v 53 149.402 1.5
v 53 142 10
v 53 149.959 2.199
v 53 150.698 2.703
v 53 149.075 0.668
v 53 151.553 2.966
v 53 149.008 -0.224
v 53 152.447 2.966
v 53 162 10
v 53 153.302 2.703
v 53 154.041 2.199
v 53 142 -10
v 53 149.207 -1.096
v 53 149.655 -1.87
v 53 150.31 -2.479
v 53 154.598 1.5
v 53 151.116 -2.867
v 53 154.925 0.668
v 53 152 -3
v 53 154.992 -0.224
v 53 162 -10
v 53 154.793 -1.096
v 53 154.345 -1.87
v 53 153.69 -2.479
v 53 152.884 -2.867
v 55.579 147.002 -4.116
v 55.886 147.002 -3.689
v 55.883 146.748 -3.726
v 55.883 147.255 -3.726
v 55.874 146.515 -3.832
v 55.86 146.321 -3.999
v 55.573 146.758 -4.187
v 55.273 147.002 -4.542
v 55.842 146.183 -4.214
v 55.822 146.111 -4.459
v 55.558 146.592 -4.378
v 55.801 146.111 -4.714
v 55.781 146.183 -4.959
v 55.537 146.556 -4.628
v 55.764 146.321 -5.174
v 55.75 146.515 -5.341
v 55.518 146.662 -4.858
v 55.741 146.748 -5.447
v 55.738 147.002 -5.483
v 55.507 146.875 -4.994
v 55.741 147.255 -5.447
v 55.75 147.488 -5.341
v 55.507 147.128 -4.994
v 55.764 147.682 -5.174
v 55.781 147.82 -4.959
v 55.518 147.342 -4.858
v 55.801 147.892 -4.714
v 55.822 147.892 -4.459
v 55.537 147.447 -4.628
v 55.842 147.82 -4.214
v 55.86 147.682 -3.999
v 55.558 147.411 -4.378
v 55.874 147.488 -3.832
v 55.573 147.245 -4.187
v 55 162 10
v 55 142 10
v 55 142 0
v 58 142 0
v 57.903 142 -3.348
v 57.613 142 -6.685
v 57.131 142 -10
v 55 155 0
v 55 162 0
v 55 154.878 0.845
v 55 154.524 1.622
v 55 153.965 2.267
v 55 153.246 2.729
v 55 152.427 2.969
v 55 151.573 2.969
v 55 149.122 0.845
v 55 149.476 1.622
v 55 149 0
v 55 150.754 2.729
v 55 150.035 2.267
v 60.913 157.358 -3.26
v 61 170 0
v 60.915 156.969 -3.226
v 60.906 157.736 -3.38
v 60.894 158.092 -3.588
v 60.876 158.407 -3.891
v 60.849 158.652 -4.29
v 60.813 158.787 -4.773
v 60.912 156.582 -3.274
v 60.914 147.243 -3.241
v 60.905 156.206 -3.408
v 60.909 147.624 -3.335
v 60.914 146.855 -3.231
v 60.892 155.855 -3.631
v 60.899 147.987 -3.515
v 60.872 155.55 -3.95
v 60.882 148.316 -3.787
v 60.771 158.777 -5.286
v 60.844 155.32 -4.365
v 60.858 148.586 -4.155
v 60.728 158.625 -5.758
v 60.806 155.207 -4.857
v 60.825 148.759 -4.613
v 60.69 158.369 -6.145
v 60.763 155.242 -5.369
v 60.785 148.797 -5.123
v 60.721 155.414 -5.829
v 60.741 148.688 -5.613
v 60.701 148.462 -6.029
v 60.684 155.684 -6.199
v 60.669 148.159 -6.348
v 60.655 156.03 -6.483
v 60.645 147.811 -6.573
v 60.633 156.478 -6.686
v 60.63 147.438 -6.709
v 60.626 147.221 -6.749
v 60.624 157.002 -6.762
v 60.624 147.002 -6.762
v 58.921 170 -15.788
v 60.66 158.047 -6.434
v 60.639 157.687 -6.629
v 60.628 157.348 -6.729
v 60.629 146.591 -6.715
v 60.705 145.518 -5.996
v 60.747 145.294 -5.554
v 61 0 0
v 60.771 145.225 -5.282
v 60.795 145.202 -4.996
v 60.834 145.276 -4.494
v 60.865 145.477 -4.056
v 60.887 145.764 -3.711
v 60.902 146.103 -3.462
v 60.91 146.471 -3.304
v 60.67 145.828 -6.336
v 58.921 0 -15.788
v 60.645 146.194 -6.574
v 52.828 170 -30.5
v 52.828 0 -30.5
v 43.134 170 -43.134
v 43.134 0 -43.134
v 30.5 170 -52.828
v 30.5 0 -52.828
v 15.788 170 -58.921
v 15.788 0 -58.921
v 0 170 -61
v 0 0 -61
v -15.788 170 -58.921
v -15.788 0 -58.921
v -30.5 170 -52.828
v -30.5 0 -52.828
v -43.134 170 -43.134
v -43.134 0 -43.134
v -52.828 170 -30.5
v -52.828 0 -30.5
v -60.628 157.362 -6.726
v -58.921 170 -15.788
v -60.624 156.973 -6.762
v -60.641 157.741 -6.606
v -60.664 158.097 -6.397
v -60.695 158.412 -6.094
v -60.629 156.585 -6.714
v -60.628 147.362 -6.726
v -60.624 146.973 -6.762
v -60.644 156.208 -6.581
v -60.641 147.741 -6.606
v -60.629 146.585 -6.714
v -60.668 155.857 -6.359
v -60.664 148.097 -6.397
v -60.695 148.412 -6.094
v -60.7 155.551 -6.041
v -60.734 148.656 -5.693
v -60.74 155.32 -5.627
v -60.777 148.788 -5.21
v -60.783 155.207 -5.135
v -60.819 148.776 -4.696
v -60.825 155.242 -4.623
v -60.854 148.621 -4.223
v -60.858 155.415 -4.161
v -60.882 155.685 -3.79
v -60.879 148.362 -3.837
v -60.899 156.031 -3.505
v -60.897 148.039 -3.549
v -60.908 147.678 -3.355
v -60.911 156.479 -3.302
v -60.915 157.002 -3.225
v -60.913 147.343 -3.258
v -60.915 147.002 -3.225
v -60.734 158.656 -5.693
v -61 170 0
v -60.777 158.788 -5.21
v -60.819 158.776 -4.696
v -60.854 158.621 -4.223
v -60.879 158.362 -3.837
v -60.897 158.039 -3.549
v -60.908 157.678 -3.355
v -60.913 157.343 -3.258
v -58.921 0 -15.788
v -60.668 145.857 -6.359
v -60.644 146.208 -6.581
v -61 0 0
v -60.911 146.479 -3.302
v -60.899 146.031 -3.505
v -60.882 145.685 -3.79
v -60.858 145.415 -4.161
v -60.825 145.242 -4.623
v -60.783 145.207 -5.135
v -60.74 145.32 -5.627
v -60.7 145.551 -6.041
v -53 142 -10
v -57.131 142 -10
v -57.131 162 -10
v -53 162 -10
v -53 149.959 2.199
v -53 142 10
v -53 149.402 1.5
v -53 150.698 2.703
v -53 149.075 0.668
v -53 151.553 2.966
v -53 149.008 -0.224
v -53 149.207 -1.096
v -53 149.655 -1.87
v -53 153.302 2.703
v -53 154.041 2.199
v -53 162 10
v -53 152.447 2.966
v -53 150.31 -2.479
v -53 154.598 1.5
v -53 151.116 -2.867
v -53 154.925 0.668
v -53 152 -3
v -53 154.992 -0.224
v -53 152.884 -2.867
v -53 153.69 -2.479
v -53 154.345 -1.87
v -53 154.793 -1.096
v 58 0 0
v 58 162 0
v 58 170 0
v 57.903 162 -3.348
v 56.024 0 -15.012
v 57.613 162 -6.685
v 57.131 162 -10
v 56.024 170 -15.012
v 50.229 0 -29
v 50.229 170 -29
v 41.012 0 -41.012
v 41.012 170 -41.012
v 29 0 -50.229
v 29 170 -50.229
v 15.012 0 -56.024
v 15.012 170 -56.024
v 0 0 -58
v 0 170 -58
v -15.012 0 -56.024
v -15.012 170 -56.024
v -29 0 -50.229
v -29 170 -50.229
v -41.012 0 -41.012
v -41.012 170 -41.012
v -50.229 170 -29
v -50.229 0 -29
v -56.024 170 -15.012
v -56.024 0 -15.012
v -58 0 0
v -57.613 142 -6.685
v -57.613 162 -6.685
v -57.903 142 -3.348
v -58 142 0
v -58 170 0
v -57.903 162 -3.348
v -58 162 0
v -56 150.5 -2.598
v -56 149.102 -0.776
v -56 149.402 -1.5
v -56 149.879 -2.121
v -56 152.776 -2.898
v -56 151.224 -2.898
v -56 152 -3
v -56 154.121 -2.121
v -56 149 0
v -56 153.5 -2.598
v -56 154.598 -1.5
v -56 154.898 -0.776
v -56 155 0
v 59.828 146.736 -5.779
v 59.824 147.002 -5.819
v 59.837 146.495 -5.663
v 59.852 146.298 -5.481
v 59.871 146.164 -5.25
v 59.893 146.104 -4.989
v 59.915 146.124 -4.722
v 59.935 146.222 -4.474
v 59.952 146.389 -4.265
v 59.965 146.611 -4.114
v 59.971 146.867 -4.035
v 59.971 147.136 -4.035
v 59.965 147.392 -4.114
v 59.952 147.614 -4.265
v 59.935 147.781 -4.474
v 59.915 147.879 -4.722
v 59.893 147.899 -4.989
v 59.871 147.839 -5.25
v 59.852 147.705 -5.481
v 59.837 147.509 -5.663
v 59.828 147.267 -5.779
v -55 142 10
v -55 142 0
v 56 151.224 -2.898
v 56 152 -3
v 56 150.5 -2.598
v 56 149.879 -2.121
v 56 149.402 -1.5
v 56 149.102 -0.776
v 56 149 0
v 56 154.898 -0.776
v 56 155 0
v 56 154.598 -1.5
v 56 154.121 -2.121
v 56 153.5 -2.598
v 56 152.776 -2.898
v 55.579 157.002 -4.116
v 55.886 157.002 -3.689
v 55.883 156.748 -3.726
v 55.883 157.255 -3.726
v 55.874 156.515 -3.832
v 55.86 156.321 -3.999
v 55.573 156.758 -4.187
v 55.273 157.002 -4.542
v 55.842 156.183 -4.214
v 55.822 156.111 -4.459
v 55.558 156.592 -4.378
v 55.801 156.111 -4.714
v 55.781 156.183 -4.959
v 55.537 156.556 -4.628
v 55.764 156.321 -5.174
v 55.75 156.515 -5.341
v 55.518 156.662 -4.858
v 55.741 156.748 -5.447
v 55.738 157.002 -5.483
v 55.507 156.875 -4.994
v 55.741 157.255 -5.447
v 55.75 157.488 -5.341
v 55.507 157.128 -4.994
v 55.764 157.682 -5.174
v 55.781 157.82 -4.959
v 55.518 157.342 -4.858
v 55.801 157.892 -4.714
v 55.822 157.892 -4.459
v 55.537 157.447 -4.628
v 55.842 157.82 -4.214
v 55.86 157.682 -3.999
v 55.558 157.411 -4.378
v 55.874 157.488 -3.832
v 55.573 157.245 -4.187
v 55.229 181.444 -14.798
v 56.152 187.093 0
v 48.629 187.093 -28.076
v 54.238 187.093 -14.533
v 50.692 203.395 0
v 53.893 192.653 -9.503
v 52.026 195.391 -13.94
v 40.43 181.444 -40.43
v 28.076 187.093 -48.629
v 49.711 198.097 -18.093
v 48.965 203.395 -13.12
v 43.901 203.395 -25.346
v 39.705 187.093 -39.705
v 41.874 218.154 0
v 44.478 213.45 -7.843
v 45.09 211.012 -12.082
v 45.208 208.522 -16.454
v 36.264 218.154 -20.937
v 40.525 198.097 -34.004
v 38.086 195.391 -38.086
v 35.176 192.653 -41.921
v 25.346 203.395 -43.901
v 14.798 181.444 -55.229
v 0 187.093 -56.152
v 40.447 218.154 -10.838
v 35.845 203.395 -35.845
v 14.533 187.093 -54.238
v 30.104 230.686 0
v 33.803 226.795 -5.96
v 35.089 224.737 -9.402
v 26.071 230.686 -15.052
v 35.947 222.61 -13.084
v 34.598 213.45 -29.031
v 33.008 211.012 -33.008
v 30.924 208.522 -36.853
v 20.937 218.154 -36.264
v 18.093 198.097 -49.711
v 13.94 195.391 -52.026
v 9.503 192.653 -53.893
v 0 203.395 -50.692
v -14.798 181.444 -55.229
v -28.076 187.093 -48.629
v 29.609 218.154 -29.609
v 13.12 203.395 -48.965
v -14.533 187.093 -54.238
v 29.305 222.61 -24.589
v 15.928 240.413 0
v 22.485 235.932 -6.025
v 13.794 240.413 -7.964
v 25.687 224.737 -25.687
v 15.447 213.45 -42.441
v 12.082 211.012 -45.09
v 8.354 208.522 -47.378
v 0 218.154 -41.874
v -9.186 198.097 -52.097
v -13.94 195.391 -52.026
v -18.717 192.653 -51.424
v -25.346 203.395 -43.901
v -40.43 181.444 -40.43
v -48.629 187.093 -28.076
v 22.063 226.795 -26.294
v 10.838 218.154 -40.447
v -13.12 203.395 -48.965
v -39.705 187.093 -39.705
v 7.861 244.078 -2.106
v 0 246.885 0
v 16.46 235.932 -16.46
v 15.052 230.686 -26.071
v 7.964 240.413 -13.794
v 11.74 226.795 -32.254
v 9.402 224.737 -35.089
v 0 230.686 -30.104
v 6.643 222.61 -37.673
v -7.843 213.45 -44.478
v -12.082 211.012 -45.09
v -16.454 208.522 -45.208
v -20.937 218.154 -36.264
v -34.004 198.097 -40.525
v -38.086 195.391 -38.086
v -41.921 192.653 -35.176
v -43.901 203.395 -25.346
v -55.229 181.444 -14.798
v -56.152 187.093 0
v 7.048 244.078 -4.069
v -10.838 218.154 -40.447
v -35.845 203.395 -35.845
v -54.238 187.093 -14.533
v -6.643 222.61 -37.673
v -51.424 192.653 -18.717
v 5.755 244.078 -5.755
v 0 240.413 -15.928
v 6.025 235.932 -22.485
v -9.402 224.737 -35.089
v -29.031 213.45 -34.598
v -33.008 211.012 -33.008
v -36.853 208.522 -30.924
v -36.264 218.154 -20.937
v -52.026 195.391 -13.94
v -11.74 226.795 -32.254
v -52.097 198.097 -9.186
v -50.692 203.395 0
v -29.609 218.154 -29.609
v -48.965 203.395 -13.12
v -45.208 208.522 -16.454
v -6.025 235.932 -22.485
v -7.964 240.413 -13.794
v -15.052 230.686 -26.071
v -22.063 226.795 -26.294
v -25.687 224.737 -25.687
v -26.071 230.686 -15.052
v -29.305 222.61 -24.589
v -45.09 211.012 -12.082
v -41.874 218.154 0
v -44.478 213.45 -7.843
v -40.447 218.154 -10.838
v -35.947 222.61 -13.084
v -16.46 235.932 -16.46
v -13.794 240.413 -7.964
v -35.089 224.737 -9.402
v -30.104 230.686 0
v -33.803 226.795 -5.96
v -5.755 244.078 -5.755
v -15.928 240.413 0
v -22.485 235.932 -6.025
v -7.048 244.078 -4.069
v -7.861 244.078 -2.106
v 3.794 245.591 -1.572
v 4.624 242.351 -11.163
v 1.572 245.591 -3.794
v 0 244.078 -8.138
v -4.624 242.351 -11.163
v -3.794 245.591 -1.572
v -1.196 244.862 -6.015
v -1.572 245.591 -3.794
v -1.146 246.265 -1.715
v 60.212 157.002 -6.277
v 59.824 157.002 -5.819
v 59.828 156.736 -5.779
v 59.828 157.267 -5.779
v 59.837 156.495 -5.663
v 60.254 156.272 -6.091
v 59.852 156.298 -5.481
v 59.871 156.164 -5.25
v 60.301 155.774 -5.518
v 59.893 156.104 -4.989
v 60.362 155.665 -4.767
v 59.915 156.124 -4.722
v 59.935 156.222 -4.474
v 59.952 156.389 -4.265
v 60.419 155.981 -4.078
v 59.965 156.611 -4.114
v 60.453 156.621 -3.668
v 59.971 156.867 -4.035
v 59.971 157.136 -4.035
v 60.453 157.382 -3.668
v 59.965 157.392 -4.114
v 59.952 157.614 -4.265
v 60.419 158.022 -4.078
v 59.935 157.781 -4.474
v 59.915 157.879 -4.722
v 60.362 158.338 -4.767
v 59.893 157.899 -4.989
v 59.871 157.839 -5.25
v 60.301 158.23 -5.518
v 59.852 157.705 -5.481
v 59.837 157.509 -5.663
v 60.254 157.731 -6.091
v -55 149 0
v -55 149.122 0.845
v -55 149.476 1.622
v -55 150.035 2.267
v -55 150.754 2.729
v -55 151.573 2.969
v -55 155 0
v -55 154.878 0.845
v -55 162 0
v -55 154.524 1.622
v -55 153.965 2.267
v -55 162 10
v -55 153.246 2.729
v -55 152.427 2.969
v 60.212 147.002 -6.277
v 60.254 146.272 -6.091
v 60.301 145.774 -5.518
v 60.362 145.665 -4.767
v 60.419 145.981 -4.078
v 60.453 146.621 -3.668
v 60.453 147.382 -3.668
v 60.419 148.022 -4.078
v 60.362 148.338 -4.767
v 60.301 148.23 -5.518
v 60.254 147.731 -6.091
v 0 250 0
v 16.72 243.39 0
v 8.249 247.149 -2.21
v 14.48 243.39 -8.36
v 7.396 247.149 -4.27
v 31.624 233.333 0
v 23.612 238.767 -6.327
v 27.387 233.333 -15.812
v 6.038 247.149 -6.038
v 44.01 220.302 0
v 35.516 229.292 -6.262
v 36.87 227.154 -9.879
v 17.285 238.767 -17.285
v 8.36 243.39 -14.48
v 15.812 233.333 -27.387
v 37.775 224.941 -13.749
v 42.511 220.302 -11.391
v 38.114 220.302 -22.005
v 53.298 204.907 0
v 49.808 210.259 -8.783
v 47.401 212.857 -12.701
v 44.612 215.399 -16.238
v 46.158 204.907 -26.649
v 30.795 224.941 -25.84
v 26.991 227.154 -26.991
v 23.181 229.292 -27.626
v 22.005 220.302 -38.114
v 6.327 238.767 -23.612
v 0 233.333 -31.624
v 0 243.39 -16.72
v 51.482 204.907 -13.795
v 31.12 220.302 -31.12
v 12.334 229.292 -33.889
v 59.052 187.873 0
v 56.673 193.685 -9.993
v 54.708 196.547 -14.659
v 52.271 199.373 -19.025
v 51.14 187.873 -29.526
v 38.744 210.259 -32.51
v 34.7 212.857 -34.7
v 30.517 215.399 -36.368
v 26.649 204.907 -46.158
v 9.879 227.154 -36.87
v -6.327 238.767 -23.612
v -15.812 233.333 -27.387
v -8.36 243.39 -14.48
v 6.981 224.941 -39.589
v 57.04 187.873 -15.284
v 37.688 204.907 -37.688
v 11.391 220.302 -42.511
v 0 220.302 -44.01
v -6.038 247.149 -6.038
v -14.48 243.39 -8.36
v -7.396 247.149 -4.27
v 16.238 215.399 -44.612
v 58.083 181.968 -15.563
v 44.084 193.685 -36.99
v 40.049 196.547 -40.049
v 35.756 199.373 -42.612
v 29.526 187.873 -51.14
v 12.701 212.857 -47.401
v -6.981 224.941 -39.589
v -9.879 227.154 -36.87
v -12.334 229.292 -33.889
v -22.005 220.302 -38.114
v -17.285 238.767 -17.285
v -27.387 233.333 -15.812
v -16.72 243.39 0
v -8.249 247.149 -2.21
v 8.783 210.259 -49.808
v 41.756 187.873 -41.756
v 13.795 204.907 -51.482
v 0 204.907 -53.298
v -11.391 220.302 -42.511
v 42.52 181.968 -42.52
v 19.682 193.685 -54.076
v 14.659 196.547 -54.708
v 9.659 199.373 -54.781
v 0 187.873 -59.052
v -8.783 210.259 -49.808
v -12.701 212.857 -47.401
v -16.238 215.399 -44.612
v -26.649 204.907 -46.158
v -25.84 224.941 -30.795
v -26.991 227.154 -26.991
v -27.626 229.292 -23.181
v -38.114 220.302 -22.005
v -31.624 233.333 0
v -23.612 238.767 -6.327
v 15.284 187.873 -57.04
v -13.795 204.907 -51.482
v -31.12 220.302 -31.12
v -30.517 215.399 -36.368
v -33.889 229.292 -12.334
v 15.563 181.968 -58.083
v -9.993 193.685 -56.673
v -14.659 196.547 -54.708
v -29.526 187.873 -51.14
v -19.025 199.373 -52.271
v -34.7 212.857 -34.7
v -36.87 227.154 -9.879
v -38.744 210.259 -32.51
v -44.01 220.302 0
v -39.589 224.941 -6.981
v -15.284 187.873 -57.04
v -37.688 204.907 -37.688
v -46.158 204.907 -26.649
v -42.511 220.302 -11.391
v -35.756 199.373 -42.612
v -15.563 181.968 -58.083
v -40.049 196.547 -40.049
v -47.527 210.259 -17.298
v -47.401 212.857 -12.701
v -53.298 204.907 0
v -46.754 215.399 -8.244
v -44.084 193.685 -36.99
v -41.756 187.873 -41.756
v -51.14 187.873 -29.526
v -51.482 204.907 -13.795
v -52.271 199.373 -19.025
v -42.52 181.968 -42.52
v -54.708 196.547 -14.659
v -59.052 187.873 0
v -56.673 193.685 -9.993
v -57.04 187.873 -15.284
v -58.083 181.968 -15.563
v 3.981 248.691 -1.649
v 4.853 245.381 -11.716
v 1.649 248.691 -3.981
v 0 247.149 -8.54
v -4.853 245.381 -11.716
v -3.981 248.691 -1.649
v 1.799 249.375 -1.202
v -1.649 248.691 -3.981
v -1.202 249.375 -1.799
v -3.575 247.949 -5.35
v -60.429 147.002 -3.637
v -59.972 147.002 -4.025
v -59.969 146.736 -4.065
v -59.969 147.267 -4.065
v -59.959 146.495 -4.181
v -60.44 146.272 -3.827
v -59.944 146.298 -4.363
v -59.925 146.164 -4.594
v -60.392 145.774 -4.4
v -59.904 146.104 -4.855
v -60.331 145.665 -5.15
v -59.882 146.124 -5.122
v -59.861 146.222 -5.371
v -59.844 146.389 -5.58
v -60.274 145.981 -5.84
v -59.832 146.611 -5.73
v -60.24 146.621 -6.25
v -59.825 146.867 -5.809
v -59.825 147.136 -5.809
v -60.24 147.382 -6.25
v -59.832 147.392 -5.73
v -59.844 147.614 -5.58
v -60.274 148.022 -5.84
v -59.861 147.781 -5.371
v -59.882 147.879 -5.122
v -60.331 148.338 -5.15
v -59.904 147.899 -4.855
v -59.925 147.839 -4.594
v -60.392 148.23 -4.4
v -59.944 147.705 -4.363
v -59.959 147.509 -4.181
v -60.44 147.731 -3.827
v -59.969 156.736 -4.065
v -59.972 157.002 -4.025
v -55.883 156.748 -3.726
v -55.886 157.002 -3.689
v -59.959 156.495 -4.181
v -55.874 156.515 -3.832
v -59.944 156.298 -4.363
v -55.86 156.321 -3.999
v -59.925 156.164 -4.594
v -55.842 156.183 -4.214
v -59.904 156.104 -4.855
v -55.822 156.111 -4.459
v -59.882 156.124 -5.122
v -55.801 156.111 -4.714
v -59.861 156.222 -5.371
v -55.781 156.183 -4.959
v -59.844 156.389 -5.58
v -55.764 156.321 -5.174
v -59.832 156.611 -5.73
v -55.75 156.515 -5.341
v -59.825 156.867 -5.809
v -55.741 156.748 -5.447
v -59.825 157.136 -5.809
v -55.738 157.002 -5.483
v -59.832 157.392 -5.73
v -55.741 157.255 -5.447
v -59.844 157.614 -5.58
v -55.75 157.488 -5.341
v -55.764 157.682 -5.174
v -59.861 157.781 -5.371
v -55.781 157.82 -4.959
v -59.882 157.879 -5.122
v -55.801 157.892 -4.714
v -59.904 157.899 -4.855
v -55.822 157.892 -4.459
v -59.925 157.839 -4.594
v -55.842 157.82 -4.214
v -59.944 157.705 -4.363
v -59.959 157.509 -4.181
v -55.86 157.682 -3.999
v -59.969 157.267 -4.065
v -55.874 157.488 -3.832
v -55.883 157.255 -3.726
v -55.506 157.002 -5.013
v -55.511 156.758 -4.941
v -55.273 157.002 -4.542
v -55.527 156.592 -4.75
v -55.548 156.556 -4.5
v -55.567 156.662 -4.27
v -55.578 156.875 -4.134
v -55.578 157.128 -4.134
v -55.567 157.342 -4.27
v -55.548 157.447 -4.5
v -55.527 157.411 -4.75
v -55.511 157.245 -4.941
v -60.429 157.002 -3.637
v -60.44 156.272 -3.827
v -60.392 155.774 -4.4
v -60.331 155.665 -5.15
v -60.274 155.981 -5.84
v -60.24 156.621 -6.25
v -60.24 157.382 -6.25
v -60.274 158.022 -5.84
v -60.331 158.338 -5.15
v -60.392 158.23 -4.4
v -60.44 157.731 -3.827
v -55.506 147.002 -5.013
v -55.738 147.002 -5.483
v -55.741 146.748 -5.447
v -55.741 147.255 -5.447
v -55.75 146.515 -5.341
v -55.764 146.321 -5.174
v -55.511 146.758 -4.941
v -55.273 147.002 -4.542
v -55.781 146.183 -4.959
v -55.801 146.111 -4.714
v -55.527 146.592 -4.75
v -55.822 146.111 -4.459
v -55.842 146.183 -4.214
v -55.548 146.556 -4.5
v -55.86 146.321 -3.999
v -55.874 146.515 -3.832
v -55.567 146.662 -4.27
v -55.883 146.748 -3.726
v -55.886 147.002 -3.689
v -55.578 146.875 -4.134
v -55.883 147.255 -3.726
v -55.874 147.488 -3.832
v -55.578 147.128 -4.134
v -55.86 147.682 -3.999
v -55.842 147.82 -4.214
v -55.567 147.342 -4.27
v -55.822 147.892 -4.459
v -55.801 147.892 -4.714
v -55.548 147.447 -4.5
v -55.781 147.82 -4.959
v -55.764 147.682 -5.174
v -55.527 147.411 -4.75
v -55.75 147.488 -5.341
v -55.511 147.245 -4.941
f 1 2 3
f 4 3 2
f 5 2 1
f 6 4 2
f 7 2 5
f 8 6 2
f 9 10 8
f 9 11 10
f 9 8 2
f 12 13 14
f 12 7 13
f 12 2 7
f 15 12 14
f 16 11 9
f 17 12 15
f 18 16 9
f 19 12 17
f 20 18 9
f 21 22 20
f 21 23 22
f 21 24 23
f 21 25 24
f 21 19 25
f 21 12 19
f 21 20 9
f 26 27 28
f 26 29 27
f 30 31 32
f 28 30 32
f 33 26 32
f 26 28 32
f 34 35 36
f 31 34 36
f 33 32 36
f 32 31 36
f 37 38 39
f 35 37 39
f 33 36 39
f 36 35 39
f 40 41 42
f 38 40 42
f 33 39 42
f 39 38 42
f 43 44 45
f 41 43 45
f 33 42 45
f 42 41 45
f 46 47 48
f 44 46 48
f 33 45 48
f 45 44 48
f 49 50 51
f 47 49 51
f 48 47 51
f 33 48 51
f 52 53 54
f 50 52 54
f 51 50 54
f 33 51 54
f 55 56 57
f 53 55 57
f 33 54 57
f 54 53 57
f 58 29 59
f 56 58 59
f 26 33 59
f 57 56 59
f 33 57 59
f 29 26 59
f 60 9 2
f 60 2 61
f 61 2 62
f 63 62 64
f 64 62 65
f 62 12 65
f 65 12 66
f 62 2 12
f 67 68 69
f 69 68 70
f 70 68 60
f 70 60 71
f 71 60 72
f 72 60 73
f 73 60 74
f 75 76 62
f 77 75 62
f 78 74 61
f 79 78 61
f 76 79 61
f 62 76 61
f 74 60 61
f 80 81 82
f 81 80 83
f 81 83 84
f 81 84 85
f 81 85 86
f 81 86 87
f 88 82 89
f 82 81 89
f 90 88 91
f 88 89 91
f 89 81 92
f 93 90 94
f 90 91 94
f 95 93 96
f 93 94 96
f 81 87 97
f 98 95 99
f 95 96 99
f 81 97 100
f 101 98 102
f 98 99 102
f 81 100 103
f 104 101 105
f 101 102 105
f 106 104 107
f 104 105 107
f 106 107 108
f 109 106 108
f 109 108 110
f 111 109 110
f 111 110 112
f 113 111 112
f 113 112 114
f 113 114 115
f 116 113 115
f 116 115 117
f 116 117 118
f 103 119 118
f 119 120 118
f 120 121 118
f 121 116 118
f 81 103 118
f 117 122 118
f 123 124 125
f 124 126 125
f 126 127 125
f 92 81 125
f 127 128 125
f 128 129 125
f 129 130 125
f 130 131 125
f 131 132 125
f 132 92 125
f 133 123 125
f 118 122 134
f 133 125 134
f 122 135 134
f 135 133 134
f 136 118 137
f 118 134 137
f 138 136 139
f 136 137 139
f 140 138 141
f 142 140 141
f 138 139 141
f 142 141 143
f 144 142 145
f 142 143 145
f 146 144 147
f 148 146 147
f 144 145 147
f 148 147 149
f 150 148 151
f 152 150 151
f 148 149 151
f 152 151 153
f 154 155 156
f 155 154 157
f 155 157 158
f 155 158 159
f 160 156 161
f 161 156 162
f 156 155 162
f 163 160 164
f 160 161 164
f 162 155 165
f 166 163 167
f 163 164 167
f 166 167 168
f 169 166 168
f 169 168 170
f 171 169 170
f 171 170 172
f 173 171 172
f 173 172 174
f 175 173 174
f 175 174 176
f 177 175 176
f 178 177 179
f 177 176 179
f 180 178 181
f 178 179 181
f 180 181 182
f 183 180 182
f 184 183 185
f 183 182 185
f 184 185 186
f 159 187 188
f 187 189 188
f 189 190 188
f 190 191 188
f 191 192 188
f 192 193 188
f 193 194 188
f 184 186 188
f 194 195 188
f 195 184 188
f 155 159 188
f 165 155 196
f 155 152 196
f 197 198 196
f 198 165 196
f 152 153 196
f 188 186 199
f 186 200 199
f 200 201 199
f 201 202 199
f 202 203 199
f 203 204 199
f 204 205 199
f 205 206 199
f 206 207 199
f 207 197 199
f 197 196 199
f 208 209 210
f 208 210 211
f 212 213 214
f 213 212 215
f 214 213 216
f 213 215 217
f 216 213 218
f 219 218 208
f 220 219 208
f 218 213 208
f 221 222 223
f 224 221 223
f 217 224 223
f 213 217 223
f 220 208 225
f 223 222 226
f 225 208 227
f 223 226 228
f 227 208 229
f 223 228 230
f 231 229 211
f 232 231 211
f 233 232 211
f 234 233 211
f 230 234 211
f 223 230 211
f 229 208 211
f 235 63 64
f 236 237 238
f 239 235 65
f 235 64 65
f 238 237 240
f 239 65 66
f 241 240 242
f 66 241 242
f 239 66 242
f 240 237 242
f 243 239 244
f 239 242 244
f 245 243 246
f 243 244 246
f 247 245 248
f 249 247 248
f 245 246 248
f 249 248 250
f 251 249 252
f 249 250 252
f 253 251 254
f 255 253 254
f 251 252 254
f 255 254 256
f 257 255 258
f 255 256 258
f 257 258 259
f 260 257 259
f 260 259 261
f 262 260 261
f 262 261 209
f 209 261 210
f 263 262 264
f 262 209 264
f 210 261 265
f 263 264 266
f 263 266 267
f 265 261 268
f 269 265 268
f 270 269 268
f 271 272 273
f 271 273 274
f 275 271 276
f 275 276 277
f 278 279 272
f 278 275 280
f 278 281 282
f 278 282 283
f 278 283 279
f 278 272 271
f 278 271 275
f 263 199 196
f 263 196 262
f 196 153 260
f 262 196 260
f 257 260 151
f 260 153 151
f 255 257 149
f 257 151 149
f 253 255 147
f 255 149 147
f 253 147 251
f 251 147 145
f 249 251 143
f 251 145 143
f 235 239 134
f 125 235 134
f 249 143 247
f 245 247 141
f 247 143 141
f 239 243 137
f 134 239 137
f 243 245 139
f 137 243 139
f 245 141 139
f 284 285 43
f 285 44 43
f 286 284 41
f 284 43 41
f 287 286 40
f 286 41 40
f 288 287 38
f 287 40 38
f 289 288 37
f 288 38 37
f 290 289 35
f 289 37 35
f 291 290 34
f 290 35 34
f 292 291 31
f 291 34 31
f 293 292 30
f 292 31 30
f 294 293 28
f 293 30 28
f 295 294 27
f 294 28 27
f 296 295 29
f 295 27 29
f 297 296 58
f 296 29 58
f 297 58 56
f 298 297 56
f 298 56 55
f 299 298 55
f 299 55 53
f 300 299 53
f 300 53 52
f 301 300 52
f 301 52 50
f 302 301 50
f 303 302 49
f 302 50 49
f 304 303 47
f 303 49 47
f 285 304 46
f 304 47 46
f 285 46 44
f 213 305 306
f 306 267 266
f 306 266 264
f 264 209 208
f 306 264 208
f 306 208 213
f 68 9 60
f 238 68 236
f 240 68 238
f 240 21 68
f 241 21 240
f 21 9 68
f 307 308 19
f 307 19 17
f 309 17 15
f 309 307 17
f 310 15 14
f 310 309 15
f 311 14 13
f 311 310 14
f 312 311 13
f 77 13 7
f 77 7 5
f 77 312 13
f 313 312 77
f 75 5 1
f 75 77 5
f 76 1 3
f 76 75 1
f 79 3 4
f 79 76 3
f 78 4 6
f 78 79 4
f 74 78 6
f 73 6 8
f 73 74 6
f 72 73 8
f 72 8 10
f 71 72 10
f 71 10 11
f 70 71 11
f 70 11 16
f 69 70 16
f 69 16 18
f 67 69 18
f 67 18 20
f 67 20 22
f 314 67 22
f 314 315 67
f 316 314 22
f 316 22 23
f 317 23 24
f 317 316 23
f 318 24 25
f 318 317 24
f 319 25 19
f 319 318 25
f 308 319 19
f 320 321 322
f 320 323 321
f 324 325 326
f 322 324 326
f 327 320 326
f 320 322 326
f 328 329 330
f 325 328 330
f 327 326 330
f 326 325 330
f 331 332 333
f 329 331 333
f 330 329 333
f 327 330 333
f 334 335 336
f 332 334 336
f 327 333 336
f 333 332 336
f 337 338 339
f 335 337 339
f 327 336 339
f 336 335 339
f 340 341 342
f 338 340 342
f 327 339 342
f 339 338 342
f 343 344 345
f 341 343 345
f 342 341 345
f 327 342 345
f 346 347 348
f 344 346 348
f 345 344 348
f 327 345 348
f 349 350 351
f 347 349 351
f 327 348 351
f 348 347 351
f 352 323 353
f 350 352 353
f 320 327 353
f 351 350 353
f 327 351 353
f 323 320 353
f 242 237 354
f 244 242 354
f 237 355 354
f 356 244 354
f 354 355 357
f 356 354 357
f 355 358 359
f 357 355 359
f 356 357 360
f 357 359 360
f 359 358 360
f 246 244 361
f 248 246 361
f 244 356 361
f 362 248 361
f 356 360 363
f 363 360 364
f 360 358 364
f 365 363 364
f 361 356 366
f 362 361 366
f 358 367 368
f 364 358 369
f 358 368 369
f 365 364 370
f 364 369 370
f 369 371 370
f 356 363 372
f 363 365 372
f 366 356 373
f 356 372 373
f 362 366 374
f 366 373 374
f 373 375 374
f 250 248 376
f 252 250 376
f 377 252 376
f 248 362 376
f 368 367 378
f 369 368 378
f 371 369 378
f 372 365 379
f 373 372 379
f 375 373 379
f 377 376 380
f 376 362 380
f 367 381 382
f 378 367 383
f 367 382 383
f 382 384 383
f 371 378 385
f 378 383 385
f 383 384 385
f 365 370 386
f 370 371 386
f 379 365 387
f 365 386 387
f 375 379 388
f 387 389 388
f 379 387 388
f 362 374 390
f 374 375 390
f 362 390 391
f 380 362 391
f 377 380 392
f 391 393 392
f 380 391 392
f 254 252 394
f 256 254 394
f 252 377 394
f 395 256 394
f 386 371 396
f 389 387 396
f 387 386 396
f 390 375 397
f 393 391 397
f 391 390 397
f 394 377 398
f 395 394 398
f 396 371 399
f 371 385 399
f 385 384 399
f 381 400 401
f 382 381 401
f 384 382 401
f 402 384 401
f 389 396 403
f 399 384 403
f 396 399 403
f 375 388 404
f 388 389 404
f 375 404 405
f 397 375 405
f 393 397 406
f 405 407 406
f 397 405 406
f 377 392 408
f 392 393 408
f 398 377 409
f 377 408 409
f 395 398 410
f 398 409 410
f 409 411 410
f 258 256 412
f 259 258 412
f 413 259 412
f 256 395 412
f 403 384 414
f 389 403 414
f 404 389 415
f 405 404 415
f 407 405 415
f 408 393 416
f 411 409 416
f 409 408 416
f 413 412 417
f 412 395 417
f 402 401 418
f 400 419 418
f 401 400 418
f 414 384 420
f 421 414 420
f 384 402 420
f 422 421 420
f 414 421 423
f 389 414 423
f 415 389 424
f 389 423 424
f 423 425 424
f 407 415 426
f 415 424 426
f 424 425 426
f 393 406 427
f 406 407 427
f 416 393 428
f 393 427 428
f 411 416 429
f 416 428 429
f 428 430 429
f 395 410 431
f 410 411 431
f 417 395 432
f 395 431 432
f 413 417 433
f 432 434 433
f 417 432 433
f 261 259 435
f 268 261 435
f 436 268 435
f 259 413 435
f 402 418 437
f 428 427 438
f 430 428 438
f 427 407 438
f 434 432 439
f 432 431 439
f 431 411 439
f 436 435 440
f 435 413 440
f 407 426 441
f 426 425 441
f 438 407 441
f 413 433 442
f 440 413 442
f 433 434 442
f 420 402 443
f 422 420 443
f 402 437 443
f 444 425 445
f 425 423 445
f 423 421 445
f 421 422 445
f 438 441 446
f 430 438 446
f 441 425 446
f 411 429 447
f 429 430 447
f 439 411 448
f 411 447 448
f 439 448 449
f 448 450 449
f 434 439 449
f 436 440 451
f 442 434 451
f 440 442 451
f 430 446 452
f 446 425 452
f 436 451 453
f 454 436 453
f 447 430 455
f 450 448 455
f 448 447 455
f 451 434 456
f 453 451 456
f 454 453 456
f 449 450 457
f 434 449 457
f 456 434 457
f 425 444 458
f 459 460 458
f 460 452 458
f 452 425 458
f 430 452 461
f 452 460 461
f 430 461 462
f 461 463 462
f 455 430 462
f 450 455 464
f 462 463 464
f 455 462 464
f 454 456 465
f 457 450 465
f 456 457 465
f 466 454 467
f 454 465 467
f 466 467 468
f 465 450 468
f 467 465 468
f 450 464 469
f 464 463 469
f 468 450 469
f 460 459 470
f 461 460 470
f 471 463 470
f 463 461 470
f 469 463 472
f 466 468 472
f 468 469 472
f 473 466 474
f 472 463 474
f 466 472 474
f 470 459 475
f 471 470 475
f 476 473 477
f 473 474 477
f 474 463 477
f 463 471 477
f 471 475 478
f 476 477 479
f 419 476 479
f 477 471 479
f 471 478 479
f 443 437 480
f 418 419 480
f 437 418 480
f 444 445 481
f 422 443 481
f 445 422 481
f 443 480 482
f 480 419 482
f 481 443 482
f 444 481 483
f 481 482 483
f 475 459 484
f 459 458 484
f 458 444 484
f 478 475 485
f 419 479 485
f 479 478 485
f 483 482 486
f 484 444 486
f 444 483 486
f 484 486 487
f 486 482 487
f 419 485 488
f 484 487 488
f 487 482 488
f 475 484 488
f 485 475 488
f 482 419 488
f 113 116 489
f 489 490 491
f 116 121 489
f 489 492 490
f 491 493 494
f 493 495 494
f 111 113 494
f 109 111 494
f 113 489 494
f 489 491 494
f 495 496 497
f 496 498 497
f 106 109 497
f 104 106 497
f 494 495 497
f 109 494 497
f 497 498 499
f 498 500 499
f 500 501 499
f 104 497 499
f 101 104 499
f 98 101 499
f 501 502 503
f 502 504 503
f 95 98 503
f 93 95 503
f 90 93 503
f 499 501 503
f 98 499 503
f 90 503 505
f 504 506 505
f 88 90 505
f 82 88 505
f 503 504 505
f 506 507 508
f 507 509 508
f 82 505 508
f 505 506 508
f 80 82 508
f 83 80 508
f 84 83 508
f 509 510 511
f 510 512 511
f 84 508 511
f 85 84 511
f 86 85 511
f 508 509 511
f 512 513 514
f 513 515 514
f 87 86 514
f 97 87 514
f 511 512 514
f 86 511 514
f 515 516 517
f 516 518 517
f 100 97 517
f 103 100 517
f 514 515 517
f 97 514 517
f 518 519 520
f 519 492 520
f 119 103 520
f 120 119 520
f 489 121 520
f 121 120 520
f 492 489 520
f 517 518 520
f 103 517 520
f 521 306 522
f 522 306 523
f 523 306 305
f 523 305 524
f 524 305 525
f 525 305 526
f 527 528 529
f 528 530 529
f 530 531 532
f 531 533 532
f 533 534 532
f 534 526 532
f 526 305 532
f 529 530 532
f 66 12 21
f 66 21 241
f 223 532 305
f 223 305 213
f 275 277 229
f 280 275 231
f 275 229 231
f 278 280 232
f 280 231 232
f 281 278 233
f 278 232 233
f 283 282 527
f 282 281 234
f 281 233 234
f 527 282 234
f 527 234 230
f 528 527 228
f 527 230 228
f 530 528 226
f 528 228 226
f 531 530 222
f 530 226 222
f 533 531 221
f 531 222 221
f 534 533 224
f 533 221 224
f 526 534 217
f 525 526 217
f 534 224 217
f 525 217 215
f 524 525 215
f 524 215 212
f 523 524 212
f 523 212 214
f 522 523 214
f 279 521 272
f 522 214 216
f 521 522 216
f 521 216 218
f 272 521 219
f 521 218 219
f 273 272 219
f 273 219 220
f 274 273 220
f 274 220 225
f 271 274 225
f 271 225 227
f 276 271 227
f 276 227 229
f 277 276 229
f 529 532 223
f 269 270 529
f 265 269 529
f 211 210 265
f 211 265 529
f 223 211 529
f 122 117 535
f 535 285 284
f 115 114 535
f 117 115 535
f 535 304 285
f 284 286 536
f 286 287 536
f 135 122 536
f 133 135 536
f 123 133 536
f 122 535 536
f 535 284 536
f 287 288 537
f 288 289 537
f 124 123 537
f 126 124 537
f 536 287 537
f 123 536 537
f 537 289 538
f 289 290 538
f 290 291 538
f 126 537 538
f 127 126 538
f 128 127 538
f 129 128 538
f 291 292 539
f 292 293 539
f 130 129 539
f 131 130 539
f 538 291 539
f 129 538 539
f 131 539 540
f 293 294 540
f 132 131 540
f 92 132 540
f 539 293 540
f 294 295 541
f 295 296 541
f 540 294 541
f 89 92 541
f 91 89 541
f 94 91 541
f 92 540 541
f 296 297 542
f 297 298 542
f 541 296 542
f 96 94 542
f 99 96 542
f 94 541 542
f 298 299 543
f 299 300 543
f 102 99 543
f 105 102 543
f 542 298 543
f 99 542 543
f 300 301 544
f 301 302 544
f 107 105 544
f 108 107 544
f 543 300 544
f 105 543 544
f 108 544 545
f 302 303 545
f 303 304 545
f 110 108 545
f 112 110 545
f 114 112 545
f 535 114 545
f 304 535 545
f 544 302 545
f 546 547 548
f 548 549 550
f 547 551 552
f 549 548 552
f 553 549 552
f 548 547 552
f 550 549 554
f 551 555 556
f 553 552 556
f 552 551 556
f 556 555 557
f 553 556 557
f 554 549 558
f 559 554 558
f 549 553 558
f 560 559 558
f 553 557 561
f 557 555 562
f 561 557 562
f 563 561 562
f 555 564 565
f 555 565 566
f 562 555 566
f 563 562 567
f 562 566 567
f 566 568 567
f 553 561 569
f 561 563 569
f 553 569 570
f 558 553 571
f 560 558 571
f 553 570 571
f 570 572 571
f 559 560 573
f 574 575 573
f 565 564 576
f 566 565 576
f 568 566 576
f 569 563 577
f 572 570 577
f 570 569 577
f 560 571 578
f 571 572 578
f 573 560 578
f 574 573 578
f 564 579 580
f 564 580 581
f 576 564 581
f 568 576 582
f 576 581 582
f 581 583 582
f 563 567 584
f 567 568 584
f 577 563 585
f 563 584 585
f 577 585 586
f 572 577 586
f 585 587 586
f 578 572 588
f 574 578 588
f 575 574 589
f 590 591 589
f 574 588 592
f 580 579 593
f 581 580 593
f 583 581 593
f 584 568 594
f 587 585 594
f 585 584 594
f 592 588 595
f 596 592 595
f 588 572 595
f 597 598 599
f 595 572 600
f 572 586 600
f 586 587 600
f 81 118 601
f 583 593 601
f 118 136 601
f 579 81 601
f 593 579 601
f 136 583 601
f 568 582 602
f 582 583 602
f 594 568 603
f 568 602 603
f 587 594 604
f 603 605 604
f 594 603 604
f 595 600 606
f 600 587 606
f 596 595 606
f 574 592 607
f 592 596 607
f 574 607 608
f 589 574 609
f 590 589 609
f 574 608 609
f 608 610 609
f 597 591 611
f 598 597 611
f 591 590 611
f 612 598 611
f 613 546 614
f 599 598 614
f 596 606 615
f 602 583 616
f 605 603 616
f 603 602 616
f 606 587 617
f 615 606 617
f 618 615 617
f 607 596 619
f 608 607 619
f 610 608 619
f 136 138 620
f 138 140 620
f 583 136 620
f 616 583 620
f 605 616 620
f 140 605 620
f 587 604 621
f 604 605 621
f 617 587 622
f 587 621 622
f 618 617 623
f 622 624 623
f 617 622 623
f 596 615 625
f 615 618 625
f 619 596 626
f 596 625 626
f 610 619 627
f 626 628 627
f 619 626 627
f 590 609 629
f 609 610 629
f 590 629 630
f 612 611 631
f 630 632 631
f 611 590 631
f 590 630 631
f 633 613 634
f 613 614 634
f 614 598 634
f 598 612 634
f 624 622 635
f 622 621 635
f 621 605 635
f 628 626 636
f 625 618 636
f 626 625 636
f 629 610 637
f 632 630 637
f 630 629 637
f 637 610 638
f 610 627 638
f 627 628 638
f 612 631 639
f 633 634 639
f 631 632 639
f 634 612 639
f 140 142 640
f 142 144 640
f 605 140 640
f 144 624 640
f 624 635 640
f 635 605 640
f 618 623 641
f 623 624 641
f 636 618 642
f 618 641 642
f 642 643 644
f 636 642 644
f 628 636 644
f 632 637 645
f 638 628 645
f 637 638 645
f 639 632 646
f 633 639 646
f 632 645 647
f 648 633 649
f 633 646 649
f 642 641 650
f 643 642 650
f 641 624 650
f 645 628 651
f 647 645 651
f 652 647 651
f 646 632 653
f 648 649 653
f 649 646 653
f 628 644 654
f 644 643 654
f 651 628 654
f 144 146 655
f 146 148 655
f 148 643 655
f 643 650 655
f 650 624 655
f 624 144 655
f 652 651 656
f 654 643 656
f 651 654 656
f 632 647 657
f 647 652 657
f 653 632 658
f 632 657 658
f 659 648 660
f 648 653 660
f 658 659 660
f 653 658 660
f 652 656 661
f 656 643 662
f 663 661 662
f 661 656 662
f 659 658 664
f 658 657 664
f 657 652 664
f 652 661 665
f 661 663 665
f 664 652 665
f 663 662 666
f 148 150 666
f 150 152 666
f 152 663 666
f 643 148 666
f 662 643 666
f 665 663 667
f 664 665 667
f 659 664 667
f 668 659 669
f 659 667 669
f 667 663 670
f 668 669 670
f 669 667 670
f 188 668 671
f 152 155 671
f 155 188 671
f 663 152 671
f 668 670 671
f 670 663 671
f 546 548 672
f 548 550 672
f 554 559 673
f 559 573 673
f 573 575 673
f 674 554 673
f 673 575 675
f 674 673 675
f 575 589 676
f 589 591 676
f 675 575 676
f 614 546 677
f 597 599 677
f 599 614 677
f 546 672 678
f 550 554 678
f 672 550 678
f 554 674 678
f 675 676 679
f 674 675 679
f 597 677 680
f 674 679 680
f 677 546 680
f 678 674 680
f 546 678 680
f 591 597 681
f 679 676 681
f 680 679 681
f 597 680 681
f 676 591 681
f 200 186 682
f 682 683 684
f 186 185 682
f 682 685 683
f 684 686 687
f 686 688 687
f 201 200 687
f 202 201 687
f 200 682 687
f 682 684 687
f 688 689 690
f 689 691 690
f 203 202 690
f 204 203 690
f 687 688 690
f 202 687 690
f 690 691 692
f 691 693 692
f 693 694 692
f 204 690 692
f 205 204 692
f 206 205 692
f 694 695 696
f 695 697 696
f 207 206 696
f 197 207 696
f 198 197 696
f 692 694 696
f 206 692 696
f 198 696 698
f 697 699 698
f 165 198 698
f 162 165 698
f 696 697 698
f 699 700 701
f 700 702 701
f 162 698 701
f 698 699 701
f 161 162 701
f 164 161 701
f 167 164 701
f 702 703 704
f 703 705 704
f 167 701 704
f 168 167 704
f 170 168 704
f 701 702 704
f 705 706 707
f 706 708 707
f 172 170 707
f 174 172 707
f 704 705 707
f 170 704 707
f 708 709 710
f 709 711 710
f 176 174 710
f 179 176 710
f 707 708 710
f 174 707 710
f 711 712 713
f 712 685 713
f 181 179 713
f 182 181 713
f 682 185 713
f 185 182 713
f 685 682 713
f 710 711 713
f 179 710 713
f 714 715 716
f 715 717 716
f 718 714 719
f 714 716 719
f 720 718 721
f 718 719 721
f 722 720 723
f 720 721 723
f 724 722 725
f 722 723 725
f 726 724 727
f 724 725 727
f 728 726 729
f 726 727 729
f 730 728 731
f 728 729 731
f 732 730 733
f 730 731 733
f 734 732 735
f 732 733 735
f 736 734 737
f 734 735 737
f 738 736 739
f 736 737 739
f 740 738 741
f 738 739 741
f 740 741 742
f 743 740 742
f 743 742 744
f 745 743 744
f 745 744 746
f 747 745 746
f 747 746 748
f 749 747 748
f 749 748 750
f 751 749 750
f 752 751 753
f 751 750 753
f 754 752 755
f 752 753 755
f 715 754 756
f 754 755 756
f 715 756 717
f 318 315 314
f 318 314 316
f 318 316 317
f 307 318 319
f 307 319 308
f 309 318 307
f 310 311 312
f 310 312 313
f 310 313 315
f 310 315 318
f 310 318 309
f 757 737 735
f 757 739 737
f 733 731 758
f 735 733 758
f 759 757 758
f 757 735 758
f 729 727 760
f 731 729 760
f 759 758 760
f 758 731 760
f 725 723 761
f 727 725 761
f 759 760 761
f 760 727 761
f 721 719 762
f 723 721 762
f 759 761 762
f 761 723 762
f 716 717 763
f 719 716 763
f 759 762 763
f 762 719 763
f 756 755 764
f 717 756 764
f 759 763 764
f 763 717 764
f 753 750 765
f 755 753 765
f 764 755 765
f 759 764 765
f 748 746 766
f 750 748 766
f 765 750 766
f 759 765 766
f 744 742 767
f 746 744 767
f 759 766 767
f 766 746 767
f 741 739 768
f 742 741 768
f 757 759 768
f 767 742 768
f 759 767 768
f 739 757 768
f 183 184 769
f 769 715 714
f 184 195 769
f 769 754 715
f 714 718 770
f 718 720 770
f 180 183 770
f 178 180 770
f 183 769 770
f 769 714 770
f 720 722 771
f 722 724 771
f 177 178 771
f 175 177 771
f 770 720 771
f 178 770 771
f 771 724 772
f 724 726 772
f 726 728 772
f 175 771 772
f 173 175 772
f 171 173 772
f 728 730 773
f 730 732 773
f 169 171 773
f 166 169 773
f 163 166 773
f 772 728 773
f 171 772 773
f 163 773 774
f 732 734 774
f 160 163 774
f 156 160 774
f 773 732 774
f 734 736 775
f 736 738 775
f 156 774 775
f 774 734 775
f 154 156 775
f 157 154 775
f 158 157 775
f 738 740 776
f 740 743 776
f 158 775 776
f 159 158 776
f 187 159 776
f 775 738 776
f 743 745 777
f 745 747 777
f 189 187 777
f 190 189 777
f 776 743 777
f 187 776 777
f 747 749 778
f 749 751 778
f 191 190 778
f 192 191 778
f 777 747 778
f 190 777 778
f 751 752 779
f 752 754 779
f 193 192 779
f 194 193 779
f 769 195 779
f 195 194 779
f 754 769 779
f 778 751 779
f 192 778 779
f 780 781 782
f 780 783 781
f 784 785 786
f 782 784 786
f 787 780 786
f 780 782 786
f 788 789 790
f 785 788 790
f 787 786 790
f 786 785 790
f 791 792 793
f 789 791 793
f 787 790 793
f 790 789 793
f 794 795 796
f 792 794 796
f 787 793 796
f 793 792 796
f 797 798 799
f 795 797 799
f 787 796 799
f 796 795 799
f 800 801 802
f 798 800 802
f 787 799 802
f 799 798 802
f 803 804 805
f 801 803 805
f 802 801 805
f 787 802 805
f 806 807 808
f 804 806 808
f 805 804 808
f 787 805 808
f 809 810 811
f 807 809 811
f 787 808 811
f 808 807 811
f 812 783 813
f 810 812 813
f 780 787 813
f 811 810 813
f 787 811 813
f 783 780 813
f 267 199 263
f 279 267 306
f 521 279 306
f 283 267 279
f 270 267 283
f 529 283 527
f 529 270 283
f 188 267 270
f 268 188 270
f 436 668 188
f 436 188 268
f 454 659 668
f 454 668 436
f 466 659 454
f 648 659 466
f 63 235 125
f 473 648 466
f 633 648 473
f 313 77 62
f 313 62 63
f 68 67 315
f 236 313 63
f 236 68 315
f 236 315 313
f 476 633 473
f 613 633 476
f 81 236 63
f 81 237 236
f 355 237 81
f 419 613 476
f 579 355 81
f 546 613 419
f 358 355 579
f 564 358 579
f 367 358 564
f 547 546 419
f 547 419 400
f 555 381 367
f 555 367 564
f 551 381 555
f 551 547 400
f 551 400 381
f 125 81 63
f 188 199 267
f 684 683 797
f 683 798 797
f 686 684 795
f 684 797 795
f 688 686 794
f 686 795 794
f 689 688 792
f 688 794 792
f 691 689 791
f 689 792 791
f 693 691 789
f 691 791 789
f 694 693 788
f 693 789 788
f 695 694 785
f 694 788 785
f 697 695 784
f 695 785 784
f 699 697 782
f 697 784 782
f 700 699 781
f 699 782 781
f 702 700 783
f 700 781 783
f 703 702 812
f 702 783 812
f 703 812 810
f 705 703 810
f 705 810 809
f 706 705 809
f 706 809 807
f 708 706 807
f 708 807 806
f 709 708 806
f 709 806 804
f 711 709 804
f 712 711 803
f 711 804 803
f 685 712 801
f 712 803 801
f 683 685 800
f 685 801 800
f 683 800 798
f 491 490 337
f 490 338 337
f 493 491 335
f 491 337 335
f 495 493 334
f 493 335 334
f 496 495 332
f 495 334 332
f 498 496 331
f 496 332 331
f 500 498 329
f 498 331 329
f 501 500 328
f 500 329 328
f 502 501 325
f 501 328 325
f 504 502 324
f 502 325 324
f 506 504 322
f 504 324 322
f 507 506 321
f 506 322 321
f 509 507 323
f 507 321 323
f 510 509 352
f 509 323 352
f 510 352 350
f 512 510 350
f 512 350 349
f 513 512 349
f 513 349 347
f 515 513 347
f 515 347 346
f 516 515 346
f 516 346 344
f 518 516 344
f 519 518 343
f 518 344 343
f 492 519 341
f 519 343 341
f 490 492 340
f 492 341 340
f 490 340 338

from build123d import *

# Parameters (mm, degrees)
REVOLVE1_ANGLE                                       = 180
BOSS_EXTRUDE1_DEPTH                                  = 10
BOSS_EXTRUDE1_DEPTH_BACK                             = 10
SKETCH2_W                                            = 5
SKETCH2_H                                            = 20
CUT_EXTRUDE1_DEPTH                                   = 10
CSK_FOR_M1_6_COUNTERSUNK_FLAT_HEAD_SCREW_D           = 1.8
CSK_FOR_M1_6_COUNTERSUNK_FLAT_HEAD_SCREW_DEPTH       = 5
CSK_FOR_M1_6_COUNTERSUNK_FLAT_HEAD_SCREW_CSINK_D     = 3.6
CSK_FOR_M1_6_COUNTERSUNK_FLAT_HEAD_SCREW_CSINK_ANGLE = 90
CSK_FOR_M1_6_COUNTERSUNK_FLAT_HEAD_SCREW_TIP         = 0.540774557
CSK_FOR_M1_6_COUNTERSUNK_FLAT_HEAD_S_2_D             = 1.8
CSK_FOR_M1_6_COUNTERSUNK_FLAT_HEAD_S_2_DEPTH         = 5
CSK_FOR_M1_6_COUNTERSUNK_FLAT_HEAD_S_2_CSINK_D       = 3.6
CSK_FOR_M1_6_COUNTERSUNK_FLAT_HEAD_S_2_CSINK_ANGLE   = 90
CSK_FOR_M1_6_COUNTERSUNK_FLAT_HEAD_S_2_TIP           = 0.540774557
CSK_FOR_M1_6_COUNTERSUNK_FLAT_HEAD_S_3_D             = 1.8
CSK_FOR_M1_6_COUNTERSUNK_FLAT_HEAD_S_3_DEPTH         = 5
CSK_FOR_M1_6_COUNTERSUNK_FLAT_HEAD_S_3_CSINK_D       = 3.6
CSK_FOR_M1_6_COUNTERSUNK_FLAT_HEAD_S_3_CSINK_ANGLE   = 90
CSK_FOR_M1_6_COUNTERSUNK_FLAT_HEAD_S_3_TIP           = 0.540774557
SKETCH9_R                                            = 3
CUT_EXTRUDE2_DEPTH                                   = 3
CUT_EXTRUDE3_START                                   = -3
SKETCH10_R                                           = 3
CUT_EXTRUDE3_DEPTH                                   = 3


with BuildPart() as part:
    # Sketch1 → Revolve1 (revolve)
    with BuildSketch(Plane.XY):
        with BuildLine():
            Line((61, 170), (61, 0))
            Line((61, 0), (58, 0))
            Line((58, 0), (58, 170))
            ThreePointArc((58, 170), (41.873834296, 218.154039035), (0, 246.884627213))
            Line((0, 246.884627213), (0, 250))
            ThreePointArc((0, 250), (44.010282534, 220.301590432), (61, 170))
        make_face()
    revolve(axis=Axis((0, 0, 0), (0, 1, 0)), revolution_arc=REVOLVE1_ANGLE)

    # Sketch2 → Boss-Extrude1 (add, two sides: drawn at the far end of the back side and taken through both)
    with BuildSketch(Plane.XY.offset(-BOSS_EXTRUDE1_DEPTH_BACK)):
        with Locations((55.5, 152)):
            Rectangle(SKETCH2_W, SKETCH2_H)
        with Locations((-55.5, 152)):
            Rectangle(SKETCH2_W, SKETCH2_H)
    extrude(amount=BOSS_EXTRUDE1_DEPTH + BOSS_EXTRUDE1_DEPTH_BACK)

    # Sketch4 → Cut-Extrude1 (cut)
    with BuildSketch(Plane.XY.offset(10)):
        Polygon((-55, 162), (-56, 162), (-58, 162), (-58, 142), (-56, 142), (-55, 142), align=None)
        Polygon((55, 142), (56, 142), (58, 142), (58, 162), (56, 162), (55, 162), align=None)
    extrude(amount=-CUT_EXTRUDE1_DEPTH, mode=Mode.SUBTRACT)

    # CSK for M1.6 Countersunk Flat Head Screw2
    with Locations(Plane(origin=(60.795081967, 157.001615154, -4.995799095), x_dir=(0.081898345823, 0, 0.996640687987), z_dir=(0.996640687987, 0, -0.081898345823))):
        with Locations((0, 0)):
            CounterSinkHole(CSK_FOR_M1_6_COUNTERSUNK_FLAT_HEAD_SCREW_D / 2, CSK_FOR_M1_6_COUNTERSUNK_FLAT_HEAD_SCREW_CSINK_D / 2, depth=CSK_FOR_M1_6_COUNTERSUNK_FLAT_HEAD_SCREW_DEPTH, counter_sink_angle=CSK_FOR_M1_6_COUNTERSUNK_FLAT_HEAD_SCREW_CSINK_ANGLE)
            with Locations((0, 0, -(CSK_FOR_M1_6_COUNTERSUNK_FLAT_HEAD_SCREW_DEPTH + CSK_FOR_M1_6_COUNTERSUNK_FLAT_HEAD_SCREW_TIP / 2))):  # 118° drill point
                Cone(0, CSK_FOR_M1_6_COUNTERSUNK_FLAT_HEAD_SCREW_D / 2, CSK_FOR_M1_6_COUNTERSUNK_FLAT_HEAD_SCREW_TIP, mode=Mode.SUBTRACT)

    # CSK for M1.6 Countersunk Flat Head S 2
    with Locations(Plane(origin=(60.795081967, 147.001615154, -4.995799095), x_dir=(0.081897976852, 0, 0.996640718307), z_dir=(0.996640718307, 0, -0.081897976852))):
        with Locations((0, 0)):
            CounterSinkHole(CSK_FOR_M1_6_COUNTERSUNK_FLAT_HEAD_S_2_D / 2, CSK_FOR_M1_6_COUNTERSUNK_FLAT_HEAD_S_2_CSINK_D / 2, depth=CSK_FOR_M1_6_COUNTERSUNK_FLAT_HEAD_S_2_DEPTH, counter_sink_angle=CSK_FOR_M1_6_COUNTERSUNK_FLAT_HEAD_S_2_CSINK_ANGLE)
            with Locations((0, 0, -(CSK_FOR_M1_6_COUNTERSUNK_FLAT_HEAD_S_2_DEPTH + CSK_FOR_M1_6_COUNTERSUNK_FLAT_HEAD_S_2_TIP / 2))):  # 118° drill point
                Cone(0, CSK_FOR_M1_6_COUNTERSUNK_FLAT_HEAD_S_2_D / 2, CSK_FOR_M1_6_COUNTERSUNK_FLAT_HEAD_S_2_TIP, mode=Mode.SUBTRACT)

    # CSK for M1.6 Countersunk Flat Head S 3
    with Locations(Plane(origin=(-60.795081967, 147.001615154, -4.995799095), x_dir=(0.081897976852, 0, -0.996640718307), z_dir=(-0.996640718307, 0, -0.081897976852))):
        with Locations((0, 0), (0, -10)):
            CounterSinkHole(CSK_FOR_M1_6_COUNTERSUNK_FLAT_HEAD_S_3_D / 2, CSK_FOR_M1_6_COUNTERSUNK_FLAT_HEAD_S_3_CSINK_D / 2, depth=CSK_FOR_M1_6_COUNTERSUNK_FLAT_HEAD_S_3_DEPTH, counter_sink_angle=CSK_FOR_M1_6_COUNTERSUNK_FLAT_HEAD_S_3_CSINK_ANGLE)
            with Locations((0, 0, -(CSK_FOR_M1_6_COUNTERSUNK_FLAT_HEAD_S_3_DEPTH + CSK_FOR_M1_6_COUNTERSUNK_FLAT_HEAD_S_3_TIP / 2))):  # 118° drill point
                Cone(0, CSK_FOR_M1_6_COUNTERSUNK_FLAT_HEAD_S_3_D / 2, CSK_FOR_M1_6_COUNTERSUNK_FLAT_HEAD_S_3_TIP, mode=Mode.SUBTRACT)

    # Sketch9 → Cut-Extrude2 (cut)
    with BuildSketch(Plane(origin=(-53, 0, 0), x_dir=(0, 0, -1), z_dir=(1, 0, 0))):
        with Locations((0, 152)):
            Circle(SKETCH9_R)
    extrude(amount=-CUT_EXTRUDE2_DEPTH, mode=Mode.SUBTRACT)

    # Sketch10 → Cut-Extrude3 (cut)
    with BuildSketch(Plane.ZY.offset(-53).offset(CUT_EXTRUDE3_START)):
        with Locations((0, 152)):
            Circle(SKETCH10_R)
    extrude(amount=CUT_EXTRUDE3_DEPTH, mode=Mode.SUBTRACT)


solid = part.part
